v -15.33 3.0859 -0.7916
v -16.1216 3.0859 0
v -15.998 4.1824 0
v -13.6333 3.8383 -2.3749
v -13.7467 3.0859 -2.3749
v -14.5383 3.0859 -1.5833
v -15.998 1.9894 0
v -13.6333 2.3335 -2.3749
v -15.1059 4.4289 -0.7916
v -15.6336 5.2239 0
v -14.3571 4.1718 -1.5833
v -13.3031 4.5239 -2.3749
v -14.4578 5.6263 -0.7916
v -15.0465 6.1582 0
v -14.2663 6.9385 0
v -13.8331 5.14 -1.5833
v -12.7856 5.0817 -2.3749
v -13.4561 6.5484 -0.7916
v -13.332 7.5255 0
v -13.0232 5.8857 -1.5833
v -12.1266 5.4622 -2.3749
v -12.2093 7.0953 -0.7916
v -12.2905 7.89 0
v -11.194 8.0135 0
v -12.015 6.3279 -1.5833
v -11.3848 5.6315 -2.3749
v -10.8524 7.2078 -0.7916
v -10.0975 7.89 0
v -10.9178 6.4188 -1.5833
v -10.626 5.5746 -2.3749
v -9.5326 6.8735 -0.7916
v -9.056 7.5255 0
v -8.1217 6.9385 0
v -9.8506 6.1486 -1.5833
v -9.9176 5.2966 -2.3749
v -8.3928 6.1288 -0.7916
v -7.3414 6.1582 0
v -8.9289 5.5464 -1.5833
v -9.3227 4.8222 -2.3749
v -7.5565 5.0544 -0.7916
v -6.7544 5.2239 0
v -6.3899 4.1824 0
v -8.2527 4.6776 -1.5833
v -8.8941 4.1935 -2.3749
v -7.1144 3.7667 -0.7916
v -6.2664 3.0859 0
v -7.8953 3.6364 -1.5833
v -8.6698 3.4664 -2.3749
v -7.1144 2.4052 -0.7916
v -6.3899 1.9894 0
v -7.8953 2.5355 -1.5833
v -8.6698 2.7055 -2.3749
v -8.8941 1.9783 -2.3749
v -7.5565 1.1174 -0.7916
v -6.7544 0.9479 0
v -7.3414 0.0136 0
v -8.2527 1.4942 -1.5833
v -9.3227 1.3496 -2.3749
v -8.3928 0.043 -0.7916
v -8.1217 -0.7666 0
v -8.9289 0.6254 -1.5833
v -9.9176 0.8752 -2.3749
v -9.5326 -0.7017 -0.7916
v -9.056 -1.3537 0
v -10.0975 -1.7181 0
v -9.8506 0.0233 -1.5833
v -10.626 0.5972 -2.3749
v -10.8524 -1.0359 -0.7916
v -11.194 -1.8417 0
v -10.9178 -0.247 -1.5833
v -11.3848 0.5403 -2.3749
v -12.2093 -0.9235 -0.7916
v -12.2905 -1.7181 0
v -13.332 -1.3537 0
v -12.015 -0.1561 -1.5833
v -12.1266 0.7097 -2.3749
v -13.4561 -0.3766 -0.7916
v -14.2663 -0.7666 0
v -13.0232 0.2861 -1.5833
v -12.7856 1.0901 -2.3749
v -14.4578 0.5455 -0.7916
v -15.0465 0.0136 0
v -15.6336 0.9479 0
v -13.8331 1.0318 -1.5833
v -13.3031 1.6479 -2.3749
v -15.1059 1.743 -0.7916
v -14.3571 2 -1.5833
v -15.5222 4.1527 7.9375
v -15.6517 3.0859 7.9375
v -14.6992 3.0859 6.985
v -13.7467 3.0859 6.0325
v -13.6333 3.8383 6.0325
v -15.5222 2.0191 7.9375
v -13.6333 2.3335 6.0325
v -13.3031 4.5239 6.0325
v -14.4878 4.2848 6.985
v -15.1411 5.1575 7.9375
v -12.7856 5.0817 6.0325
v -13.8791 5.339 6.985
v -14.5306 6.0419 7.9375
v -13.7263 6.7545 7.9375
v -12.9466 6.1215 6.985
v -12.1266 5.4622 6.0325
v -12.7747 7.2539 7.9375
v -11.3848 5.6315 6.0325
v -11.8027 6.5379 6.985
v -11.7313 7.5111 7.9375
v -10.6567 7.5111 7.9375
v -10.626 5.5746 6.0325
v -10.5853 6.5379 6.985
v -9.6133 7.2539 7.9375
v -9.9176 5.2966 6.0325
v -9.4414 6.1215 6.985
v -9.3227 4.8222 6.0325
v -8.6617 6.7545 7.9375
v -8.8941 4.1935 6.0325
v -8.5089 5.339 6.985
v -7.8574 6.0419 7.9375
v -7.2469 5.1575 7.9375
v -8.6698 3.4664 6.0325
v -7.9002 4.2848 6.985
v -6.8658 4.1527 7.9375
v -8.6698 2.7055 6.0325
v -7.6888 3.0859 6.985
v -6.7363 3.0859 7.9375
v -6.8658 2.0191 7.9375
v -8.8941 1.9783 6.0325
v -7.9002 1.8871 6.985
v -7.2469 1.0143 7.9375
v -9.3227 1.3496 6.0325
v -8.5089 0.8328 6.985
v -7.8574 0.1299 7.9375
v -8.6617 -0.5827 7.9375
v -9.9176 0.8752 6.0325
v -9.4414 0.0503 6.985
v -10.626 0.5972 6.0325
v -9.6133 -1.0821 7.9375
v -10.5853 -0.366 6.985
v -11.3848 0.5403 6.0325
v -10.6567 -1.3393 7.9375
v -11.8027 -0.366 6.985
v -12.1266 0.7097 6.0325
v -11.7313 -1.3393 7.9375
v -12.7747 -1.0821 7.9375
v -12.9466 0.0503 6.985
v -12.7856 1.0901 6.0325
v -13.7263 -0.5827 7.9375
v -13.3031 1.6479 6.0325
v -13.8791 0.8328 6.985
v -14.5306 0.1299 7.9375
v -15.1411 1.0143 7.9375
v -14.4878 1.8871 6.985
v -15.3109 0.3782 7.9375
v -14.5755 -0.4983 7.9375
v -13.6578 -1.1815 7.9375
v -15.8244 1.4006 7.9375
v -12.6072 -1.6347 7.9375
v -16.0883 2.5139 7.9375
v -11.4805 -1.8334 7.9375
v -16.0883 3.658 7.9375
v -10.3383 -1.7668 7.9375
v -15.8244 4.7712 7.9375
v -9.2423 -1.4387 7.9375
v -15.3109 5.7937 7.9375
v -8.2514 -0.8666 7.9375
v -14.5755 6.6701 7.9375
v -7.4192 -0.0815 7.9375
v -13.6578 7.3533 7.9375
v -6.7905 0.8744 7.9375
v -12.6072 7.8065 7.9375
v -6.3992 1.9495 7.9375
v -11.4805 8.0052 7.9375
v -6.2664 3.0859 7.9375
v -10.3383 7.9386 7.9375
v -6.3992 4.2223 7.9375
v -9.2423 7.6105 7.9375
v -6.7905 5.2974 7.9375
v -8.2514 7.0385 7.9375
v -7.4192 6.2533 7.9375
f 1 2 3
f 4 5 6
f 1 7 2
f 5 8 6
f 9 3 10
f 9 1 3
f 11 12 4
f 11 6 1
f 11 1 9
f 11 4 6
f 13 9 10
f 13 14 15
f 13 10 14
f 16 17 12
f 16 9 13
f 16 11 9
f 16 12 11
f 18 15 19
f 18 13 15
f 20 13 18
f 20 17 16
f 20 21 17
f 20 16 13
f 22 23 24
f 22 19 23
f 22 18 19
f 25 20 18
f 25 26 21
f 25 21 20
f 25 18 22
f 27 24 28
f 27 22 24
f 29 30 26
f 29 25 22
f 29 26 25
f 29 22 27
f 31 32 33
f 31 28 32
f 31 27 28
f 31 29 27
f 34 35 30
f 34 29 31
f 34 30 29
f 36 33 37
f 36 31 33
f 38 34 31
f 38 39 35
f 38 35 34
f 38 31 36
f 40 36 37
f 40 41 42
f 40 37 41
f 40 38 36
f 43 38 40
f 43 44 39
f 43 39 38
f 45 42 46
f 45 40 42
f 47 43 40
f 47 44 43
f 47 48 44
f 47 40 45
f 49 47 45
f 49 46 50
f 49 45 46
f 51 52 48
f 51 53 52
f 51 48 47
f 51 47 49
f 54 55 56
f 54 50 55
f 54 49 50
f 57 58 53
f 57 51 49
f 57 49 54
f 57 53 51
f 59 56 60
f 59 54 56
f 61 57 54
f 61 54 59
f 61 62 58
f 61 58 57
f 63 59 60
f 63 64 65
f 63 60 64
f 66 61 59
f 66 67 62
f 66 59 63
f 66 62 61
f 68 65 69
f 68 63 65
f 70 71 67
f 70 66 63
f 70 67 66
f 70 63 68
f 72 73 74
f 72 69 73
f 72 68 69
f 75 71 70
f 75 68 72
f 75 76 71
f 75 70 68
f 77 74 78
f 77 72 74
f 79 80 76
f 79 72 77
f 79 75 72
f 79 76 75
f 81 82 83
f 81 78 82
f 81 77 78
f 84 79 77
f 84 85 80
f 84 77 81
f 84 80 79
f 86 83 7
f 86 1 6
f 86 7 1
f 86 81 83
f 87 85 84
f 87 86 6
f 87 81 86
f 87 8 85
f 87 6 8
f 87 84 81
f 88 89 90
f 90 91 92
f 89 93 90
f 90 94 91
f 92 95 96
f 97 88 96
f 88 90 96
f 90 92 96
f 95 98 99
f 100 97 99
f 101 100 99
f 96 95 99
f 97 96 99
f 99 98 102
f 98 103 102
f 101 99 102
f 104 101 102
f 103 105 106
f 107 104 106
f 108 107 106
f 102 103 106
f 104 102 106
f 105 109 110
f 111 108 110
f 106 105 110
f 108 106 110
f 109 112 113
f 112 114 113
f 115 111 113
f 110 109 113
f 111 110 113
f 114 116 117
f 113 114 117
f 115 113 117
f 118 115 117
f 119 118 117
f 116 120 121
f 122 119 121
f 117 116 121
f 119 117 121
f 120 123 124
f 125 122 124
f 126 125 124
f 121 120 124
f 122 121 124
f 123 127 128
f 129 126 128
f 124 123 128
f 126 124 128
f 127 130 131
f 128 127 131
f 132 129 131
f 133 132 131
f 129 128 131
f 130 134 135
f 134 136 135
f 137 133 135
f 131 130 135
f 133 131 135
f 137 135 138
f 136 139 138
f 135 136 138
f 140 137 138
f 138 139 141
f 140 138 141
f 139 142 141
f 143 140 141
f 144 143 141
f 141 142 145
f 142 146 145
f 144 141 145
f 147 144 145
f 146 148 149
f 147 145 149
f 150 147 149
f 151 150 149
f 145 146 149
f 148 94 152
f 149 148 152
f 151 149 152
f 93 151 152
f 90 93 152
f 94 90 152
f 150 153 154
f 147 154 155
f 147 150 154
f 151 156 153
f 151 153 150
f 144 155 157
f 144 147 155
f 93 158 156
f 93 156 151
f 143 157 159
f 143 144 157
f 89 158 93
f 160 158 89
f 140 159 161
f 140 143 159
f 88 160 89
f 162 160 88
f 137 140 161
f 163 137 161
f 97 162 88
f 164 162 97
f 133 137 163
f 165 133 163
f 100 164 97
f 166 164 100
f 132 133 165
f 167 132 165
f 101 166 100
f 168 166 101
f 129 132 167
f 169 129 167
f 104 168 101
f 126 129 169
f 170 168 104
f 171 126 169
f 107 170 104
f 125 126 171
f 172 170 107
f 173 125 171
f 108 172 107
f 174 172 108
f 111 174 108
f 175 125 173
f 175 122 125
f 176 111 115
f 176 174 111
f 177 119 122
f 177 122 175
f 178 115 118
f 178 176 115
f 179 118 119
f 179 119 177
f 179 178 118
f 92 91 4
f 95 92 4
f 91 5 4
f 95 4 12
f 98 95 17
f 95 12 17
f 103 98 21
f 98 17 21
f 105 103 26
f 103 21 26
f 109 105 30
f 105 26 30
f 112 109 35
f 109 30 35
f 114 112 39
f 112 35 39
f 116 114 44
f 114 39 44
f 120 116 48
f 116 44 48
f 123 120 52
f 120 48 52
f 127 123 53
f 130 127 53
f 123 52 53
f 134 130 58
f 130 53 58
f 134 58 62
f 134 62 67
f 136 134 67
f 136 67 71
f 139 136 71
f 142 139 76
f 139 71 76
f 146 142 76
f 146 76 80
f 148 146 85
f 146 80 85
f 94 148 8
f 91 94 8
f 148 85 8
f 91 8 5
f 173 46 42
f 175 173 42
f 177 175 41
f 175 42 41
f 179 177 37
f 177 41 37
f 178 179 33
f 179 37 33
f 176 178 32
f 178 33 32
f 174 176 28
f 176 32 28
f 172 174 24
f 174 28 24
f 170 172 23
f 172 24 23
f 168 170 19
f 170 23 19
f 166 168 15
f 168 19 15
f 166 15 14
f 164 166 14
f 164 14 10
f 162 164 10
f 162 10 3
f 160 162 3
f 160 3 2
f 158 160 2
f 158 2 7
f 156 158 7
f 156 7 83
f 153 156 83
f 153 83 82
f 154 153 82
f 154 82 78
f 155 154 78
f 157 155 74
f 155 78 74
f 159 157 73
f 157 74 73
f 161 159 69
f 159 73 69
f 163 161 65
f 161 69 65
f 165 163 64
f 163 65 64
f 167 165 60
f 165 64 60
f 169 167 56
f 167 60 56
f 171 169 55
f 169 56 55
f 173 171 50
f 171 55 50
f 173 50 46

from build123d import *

# Parameters (mm, degrees)
SKETCH1_R                         = 4.9276
BOSS_EXTRUDE1_DEPTH               = 7.9375
SKETCH4_R                         = 4.9276
BOSS_EXTRUDE2_DEPTH               = 3.175
BOSS_EXTRUDE2_TAPER               = 45
F_1_4_20_TAPPED_HOLE1_D           = 5.1054
F_1_4_20_TAPPED_HOLE1_DEPTH       = 16.51
F_1_4_20_TAPPED_HOLE1_CSINK_D     = 8.9154
F_1_4_20_TAPPED_HOLE1_CSINK_ANGLE = 90
F_1_4_20_TAPPED_HOLE1_TIP         = 1.533816902


with BuildPart() as part:
    # Sketch1 → Boss-Extrude1 (new body)
    with BuildSketch(Plane.XY):
        with Locations((-11.193990041, 3.085910768)):
            Circle(SKETCH1_R)
    extrude(amount=BOSS_EXTRUDE1_DEPTH)

    # Sketch4 → Boss-Extrude2 (add)
    with BuildSketch(Plane(origin=(0, 0, 0), x_dir=(-1, 0, 0), z_dir=(0, 0, -1))):
        with Locations((11.193990041, 3.085910768)):
            Circle(SKETCH4_R)
    extrude(amount=BOSS_EXTRUDE2_DEPTH, taper=BOSS_EXTRUDE2_TAPER)

    # 1/4-20 Tapped Hole1
    with Locations(Plane.XY.offset(7.9375)):
        with Locations((-11.193990041, 3.085910768)):
            CounterSinkHole(F_1_4_20_TAPPED_HOLE1_D / 2, F_1_4_20_TAPPED_HOLE1_CSINK_D / 2, depth=F_1_4_20_TAPPED_HOLE1_DEPTH, counter_sink_angle=F_1_4_20_TAPPED_HOLE1_CSINK_ANGLE)
            with Locations((0, 0, -(F_1_4_20_TAPPED_HOLE1_DEPTH + F_1_4_20_TAPPED_HOLE1_TIP / 2))):  # 118° drill point
                Cone(0, F_1_4_20_TAPPED_HOLE1_D / 2, F_1_4_20_TAPPED_HOLE1_TIP, mode=Mode.SUBTRACT)


solid = part.part
